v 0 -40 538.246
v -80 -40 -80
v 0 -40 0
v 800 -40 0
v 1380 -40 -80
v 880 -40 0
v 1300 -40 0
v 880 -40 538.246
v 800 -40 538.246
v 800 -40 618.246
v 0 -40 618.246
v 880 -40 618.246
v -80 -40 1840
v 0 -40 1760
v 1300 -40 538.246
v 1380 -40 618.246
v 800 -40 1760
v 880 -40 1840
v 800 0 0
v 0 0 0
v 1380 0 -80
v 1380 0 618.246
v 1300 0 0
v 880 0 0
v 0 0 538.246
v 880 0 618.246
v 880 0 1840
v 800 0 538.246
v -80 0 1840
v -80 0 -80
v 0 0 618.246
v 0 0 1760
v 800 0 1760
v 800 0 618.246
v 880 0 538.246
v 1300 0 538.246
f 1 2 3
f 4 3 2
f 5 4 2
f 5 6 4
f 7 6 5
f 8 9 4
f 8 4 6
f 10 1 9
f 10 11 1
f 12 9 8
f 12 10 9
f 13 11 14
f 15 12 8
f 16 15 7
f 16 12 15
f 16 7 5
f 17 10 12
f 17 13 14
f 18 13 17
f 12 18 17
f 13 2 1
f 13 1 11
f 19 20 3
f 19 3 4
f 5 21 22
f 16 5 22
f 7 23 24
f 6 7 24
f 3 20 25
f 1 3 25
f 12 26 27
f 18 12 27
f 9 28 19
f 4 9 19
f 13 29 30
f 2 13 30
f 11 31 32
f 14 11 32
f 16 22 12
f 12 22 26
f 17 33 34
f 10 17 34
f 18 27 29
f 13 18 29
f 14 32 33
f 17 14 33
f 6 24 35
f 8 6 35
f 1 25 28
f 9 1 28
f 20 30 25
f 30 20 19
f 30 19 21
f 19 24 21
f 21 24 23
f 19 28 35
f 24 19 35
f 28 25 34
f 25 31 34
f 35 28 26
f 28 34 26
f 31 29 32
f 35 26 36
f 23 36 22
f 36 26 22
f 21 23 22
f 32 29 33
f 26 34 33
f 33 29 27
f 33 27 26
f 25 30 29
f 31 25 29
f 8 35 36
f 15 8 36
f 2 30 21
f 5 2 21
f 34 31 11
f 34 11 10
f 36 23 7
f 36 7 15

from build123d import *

# Parameters (mm, degrees)
F0_W     = 800
F0_H     = 80
F1_DEPTH = 40
F0_W_2   = 420
F0_W_3   = 80
F0_H_2   = 538.2458400726
F2_DEPTH = 40
F3_DEPTH = 40


# Not quite as in the source:
# - a feature names something its author has since deleted; it is built from what else it names


with BuildPart() as f1:
    # F0 (on Front) → F1 (new body)
    with BuildSketch(Plane.XZ):
        with Locations((400, 1800)):
            Rectangle(F0_W, F0_H)
        Polygon((-80, 1840), (-80, -80), (0, -80), (0, 0), (0, 538.2458400726), (0, 618.2458400726), (0, 1760), (0, 1840), align=None)
        with Locations((400, -40)):
            Rectangle(F0_W, F0_H)
        Polygon((800, 0), (800, -80), (880, -80), (880, 0), (880, 538.2458400726), (880, 618.2458400726), (880, 1840), (800, 1840), (800, 1760), (800, 618.2458400726), (800, 538.2458400726), align=None)
    extrude(amount=F1_DEPTH)

    # F0 (on Front) → F2 (join)
    with BuildSketch(Plane.XZ):
        Polygon((-80, 1840), (-80, -80), (0, -80), (0, 0), (0, 538.2458400726), (0, 618.2458400726), (0, 1760), (0, 1840), align=None)
        with Locations((400, -40)):
            Rectangle(F0_W, F0_H)
        with Locations((400, 1800)):
            Rectangle(F0_W, F0_H)
        Polygon((800, 0), (800, -80), (880, -80), (880, 0), (880, 538.2458400726), (880, 618.2458400726), (880, 1840), (800, 1840), (800, 1760), (800, 618.2458400726), (800, 538.2458400726), align=None)
        Polygon((880, 0), (880, -80), (1380, -80), (1380, 0), (1300, 0), align=None)
        with Locations((1090, 578.2458400726)):
            Rectangle(F0_W_2, F0_H)
        with Locations((1340, 269.1229200363)):
            Rectangle(F0_W_3, F0_H_2)
        with Locations((1340, 578.2458400726)):
            Rectangle(F0_W_3, F0_H)
    extrude(amount=F2_DEPTH)

    # F0 (on Front) → F3 (join)
    with BuildSketch(Plane.XZ):
        with Locations((400, 578.2458400726)):
            Rectangle(F0_W, F0_H)
    extrude(amount=F3_DEPTH)


solid = f1.part
